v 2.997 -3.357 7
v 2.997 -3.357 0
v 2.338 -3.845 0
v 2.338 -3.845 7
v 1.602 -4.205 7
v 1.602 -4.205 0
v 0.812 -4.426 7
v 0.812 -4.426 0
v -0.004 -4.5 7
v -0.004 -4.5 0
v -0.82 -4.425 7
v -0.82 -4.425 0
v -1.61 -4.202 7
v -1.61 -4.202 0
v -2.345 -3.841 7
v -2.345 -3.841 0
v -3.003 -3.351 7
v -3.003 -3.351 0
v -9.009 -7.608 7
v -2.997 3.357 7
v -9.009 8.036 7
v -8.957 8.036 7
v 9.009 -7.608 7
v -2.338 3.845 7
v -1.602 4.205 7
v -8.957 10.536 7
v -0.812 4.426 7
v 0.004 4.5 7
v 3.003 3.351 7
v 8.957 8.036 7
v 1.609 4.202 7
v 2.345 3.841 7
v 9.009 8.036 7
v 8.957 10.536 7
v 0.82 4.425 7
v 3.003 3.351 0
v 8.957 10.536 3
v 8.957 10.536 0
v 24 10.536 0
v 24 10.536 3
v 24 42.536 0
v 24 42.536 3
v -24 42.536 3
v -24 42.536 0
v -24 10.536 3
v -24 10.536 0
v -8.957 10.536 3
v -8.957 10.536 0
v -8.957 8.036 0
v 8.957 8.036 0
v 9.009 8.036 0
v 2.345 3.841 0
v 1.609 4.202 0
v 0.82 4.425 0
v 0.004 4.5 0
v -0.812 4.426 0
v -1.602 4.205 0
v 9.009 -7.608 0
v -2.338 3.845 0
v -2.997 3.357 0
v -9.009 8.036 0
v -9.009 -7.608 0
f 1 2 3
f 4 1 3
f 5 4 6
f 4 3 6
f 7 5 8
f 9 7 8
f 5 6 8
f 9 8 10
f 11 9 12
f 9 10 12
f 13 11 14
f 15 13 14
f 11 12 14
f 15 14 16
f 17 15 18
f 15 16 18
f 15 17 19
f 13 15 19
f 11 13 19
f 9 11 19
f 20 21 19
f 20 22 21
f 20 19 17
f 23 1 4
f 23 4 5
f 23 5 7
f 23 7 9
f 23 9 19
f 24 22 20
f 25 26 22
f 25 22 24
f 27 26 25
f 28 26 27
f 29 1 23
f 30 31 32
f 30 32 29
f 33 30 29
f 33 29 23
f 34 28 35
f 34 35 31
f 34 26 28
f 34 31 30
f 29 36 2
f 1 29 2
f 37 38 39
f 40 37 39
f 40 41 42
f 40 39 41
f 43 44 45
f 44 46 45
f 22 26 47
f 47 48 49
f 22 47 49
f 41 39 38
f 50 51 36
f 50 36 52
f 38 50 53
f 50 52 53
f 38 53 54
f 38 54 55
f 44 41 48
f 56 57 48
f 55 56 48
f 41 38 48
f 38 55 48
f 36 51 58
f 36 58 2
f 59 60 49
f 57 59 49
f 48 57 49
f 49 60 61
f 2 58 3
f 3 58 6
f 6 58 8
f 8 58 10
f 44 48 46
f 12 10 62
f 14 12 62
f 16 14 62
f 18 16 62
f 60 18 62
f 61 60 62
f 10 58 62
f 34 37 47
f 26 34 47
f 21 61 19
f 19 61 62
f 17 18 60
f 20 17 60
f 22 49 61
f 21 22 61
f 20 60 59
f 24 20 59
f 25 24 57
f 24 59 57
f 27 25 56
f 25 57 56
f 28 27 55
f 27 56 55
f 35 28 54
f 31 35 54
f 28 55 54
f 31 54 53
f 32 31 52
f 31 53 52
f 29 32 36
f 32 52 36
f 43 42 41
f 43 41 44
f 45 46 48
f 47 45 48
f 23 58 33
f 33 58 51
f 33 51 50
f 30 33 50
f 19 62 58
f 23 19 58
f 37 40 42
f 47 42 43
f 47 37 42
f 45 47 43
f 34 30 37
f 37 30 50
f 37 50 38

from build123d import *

# Parameters (mm, degrees)
F1_DEPTH = 7
F2_DEPTH = 3
F3_W     = 48
F3_H     = 3
F4_DEPTH = 27


with BuildPart() as f1:
    # F0 (on Top) → F1 (new body)
    with BuildSketch(Plane.XY):
        Polygon((0.000171, 8.035728), (-6.356564, 8.035728), (-8.956735, 8.035728), (-9.009132, 8.035728), (-9.009132, -7.608017), (9.009474, -7.608017), (9.009474, 8.035728), (8.956735, 8.035728), (6.356564, 8.035728), align=None)
        with BuildLine():
            Line((3.00302, 3.351398), (2.996931, -3.356845))
            ThreePointArc((2.996931, -3.356845), (-0.004116, -4.499998), (-3.003067, -3.351357))
            Line((-3.003067, -3.351357), (-2.996977, 3.356803))
            ThreePointArc((-2.996977, 3.356803), (0.004054, 4.499998), (3.00302, 3.351398))
        make_face(mode=Mode.SUBTRACT)
        Polygon((-8.956735, 8.035728), (-6.356564, 8.035728), (0.000171, 8.035728), (6.356564, 8.035728), (8.956735, 8.035728), (8.956735, 10.535728), (0, 10.535728), (-8.956735, 10.535728), align=None)
    extrude(amount=F1_DEPTH)

    # F0 (on Top) → F2 (join)
    with BuildSketch(Plane.XY):
        Polygon((-24, 10.535728), (-8.956735, 10.535728), (0, 10.535728), (8.956735, 10.535728), (24, 10.535728), (24, 15.535728), (0, 15.535728), (-24, 15.535728), align=None)
    extrude(amount=F2_DEPTH)

    # F3 (on face) → F4 (join)
    with BuildSketch(Plane(origin=(0, 15.535728, 0), x_dir=(-1, 0, 0), z_dir=(0, 1, 0))):
        with Locations((0, 1.5)):
            Rectangle(F3_W, F3_H)
    extrude(amount=F4_DEPTH)


solid = f1.part
